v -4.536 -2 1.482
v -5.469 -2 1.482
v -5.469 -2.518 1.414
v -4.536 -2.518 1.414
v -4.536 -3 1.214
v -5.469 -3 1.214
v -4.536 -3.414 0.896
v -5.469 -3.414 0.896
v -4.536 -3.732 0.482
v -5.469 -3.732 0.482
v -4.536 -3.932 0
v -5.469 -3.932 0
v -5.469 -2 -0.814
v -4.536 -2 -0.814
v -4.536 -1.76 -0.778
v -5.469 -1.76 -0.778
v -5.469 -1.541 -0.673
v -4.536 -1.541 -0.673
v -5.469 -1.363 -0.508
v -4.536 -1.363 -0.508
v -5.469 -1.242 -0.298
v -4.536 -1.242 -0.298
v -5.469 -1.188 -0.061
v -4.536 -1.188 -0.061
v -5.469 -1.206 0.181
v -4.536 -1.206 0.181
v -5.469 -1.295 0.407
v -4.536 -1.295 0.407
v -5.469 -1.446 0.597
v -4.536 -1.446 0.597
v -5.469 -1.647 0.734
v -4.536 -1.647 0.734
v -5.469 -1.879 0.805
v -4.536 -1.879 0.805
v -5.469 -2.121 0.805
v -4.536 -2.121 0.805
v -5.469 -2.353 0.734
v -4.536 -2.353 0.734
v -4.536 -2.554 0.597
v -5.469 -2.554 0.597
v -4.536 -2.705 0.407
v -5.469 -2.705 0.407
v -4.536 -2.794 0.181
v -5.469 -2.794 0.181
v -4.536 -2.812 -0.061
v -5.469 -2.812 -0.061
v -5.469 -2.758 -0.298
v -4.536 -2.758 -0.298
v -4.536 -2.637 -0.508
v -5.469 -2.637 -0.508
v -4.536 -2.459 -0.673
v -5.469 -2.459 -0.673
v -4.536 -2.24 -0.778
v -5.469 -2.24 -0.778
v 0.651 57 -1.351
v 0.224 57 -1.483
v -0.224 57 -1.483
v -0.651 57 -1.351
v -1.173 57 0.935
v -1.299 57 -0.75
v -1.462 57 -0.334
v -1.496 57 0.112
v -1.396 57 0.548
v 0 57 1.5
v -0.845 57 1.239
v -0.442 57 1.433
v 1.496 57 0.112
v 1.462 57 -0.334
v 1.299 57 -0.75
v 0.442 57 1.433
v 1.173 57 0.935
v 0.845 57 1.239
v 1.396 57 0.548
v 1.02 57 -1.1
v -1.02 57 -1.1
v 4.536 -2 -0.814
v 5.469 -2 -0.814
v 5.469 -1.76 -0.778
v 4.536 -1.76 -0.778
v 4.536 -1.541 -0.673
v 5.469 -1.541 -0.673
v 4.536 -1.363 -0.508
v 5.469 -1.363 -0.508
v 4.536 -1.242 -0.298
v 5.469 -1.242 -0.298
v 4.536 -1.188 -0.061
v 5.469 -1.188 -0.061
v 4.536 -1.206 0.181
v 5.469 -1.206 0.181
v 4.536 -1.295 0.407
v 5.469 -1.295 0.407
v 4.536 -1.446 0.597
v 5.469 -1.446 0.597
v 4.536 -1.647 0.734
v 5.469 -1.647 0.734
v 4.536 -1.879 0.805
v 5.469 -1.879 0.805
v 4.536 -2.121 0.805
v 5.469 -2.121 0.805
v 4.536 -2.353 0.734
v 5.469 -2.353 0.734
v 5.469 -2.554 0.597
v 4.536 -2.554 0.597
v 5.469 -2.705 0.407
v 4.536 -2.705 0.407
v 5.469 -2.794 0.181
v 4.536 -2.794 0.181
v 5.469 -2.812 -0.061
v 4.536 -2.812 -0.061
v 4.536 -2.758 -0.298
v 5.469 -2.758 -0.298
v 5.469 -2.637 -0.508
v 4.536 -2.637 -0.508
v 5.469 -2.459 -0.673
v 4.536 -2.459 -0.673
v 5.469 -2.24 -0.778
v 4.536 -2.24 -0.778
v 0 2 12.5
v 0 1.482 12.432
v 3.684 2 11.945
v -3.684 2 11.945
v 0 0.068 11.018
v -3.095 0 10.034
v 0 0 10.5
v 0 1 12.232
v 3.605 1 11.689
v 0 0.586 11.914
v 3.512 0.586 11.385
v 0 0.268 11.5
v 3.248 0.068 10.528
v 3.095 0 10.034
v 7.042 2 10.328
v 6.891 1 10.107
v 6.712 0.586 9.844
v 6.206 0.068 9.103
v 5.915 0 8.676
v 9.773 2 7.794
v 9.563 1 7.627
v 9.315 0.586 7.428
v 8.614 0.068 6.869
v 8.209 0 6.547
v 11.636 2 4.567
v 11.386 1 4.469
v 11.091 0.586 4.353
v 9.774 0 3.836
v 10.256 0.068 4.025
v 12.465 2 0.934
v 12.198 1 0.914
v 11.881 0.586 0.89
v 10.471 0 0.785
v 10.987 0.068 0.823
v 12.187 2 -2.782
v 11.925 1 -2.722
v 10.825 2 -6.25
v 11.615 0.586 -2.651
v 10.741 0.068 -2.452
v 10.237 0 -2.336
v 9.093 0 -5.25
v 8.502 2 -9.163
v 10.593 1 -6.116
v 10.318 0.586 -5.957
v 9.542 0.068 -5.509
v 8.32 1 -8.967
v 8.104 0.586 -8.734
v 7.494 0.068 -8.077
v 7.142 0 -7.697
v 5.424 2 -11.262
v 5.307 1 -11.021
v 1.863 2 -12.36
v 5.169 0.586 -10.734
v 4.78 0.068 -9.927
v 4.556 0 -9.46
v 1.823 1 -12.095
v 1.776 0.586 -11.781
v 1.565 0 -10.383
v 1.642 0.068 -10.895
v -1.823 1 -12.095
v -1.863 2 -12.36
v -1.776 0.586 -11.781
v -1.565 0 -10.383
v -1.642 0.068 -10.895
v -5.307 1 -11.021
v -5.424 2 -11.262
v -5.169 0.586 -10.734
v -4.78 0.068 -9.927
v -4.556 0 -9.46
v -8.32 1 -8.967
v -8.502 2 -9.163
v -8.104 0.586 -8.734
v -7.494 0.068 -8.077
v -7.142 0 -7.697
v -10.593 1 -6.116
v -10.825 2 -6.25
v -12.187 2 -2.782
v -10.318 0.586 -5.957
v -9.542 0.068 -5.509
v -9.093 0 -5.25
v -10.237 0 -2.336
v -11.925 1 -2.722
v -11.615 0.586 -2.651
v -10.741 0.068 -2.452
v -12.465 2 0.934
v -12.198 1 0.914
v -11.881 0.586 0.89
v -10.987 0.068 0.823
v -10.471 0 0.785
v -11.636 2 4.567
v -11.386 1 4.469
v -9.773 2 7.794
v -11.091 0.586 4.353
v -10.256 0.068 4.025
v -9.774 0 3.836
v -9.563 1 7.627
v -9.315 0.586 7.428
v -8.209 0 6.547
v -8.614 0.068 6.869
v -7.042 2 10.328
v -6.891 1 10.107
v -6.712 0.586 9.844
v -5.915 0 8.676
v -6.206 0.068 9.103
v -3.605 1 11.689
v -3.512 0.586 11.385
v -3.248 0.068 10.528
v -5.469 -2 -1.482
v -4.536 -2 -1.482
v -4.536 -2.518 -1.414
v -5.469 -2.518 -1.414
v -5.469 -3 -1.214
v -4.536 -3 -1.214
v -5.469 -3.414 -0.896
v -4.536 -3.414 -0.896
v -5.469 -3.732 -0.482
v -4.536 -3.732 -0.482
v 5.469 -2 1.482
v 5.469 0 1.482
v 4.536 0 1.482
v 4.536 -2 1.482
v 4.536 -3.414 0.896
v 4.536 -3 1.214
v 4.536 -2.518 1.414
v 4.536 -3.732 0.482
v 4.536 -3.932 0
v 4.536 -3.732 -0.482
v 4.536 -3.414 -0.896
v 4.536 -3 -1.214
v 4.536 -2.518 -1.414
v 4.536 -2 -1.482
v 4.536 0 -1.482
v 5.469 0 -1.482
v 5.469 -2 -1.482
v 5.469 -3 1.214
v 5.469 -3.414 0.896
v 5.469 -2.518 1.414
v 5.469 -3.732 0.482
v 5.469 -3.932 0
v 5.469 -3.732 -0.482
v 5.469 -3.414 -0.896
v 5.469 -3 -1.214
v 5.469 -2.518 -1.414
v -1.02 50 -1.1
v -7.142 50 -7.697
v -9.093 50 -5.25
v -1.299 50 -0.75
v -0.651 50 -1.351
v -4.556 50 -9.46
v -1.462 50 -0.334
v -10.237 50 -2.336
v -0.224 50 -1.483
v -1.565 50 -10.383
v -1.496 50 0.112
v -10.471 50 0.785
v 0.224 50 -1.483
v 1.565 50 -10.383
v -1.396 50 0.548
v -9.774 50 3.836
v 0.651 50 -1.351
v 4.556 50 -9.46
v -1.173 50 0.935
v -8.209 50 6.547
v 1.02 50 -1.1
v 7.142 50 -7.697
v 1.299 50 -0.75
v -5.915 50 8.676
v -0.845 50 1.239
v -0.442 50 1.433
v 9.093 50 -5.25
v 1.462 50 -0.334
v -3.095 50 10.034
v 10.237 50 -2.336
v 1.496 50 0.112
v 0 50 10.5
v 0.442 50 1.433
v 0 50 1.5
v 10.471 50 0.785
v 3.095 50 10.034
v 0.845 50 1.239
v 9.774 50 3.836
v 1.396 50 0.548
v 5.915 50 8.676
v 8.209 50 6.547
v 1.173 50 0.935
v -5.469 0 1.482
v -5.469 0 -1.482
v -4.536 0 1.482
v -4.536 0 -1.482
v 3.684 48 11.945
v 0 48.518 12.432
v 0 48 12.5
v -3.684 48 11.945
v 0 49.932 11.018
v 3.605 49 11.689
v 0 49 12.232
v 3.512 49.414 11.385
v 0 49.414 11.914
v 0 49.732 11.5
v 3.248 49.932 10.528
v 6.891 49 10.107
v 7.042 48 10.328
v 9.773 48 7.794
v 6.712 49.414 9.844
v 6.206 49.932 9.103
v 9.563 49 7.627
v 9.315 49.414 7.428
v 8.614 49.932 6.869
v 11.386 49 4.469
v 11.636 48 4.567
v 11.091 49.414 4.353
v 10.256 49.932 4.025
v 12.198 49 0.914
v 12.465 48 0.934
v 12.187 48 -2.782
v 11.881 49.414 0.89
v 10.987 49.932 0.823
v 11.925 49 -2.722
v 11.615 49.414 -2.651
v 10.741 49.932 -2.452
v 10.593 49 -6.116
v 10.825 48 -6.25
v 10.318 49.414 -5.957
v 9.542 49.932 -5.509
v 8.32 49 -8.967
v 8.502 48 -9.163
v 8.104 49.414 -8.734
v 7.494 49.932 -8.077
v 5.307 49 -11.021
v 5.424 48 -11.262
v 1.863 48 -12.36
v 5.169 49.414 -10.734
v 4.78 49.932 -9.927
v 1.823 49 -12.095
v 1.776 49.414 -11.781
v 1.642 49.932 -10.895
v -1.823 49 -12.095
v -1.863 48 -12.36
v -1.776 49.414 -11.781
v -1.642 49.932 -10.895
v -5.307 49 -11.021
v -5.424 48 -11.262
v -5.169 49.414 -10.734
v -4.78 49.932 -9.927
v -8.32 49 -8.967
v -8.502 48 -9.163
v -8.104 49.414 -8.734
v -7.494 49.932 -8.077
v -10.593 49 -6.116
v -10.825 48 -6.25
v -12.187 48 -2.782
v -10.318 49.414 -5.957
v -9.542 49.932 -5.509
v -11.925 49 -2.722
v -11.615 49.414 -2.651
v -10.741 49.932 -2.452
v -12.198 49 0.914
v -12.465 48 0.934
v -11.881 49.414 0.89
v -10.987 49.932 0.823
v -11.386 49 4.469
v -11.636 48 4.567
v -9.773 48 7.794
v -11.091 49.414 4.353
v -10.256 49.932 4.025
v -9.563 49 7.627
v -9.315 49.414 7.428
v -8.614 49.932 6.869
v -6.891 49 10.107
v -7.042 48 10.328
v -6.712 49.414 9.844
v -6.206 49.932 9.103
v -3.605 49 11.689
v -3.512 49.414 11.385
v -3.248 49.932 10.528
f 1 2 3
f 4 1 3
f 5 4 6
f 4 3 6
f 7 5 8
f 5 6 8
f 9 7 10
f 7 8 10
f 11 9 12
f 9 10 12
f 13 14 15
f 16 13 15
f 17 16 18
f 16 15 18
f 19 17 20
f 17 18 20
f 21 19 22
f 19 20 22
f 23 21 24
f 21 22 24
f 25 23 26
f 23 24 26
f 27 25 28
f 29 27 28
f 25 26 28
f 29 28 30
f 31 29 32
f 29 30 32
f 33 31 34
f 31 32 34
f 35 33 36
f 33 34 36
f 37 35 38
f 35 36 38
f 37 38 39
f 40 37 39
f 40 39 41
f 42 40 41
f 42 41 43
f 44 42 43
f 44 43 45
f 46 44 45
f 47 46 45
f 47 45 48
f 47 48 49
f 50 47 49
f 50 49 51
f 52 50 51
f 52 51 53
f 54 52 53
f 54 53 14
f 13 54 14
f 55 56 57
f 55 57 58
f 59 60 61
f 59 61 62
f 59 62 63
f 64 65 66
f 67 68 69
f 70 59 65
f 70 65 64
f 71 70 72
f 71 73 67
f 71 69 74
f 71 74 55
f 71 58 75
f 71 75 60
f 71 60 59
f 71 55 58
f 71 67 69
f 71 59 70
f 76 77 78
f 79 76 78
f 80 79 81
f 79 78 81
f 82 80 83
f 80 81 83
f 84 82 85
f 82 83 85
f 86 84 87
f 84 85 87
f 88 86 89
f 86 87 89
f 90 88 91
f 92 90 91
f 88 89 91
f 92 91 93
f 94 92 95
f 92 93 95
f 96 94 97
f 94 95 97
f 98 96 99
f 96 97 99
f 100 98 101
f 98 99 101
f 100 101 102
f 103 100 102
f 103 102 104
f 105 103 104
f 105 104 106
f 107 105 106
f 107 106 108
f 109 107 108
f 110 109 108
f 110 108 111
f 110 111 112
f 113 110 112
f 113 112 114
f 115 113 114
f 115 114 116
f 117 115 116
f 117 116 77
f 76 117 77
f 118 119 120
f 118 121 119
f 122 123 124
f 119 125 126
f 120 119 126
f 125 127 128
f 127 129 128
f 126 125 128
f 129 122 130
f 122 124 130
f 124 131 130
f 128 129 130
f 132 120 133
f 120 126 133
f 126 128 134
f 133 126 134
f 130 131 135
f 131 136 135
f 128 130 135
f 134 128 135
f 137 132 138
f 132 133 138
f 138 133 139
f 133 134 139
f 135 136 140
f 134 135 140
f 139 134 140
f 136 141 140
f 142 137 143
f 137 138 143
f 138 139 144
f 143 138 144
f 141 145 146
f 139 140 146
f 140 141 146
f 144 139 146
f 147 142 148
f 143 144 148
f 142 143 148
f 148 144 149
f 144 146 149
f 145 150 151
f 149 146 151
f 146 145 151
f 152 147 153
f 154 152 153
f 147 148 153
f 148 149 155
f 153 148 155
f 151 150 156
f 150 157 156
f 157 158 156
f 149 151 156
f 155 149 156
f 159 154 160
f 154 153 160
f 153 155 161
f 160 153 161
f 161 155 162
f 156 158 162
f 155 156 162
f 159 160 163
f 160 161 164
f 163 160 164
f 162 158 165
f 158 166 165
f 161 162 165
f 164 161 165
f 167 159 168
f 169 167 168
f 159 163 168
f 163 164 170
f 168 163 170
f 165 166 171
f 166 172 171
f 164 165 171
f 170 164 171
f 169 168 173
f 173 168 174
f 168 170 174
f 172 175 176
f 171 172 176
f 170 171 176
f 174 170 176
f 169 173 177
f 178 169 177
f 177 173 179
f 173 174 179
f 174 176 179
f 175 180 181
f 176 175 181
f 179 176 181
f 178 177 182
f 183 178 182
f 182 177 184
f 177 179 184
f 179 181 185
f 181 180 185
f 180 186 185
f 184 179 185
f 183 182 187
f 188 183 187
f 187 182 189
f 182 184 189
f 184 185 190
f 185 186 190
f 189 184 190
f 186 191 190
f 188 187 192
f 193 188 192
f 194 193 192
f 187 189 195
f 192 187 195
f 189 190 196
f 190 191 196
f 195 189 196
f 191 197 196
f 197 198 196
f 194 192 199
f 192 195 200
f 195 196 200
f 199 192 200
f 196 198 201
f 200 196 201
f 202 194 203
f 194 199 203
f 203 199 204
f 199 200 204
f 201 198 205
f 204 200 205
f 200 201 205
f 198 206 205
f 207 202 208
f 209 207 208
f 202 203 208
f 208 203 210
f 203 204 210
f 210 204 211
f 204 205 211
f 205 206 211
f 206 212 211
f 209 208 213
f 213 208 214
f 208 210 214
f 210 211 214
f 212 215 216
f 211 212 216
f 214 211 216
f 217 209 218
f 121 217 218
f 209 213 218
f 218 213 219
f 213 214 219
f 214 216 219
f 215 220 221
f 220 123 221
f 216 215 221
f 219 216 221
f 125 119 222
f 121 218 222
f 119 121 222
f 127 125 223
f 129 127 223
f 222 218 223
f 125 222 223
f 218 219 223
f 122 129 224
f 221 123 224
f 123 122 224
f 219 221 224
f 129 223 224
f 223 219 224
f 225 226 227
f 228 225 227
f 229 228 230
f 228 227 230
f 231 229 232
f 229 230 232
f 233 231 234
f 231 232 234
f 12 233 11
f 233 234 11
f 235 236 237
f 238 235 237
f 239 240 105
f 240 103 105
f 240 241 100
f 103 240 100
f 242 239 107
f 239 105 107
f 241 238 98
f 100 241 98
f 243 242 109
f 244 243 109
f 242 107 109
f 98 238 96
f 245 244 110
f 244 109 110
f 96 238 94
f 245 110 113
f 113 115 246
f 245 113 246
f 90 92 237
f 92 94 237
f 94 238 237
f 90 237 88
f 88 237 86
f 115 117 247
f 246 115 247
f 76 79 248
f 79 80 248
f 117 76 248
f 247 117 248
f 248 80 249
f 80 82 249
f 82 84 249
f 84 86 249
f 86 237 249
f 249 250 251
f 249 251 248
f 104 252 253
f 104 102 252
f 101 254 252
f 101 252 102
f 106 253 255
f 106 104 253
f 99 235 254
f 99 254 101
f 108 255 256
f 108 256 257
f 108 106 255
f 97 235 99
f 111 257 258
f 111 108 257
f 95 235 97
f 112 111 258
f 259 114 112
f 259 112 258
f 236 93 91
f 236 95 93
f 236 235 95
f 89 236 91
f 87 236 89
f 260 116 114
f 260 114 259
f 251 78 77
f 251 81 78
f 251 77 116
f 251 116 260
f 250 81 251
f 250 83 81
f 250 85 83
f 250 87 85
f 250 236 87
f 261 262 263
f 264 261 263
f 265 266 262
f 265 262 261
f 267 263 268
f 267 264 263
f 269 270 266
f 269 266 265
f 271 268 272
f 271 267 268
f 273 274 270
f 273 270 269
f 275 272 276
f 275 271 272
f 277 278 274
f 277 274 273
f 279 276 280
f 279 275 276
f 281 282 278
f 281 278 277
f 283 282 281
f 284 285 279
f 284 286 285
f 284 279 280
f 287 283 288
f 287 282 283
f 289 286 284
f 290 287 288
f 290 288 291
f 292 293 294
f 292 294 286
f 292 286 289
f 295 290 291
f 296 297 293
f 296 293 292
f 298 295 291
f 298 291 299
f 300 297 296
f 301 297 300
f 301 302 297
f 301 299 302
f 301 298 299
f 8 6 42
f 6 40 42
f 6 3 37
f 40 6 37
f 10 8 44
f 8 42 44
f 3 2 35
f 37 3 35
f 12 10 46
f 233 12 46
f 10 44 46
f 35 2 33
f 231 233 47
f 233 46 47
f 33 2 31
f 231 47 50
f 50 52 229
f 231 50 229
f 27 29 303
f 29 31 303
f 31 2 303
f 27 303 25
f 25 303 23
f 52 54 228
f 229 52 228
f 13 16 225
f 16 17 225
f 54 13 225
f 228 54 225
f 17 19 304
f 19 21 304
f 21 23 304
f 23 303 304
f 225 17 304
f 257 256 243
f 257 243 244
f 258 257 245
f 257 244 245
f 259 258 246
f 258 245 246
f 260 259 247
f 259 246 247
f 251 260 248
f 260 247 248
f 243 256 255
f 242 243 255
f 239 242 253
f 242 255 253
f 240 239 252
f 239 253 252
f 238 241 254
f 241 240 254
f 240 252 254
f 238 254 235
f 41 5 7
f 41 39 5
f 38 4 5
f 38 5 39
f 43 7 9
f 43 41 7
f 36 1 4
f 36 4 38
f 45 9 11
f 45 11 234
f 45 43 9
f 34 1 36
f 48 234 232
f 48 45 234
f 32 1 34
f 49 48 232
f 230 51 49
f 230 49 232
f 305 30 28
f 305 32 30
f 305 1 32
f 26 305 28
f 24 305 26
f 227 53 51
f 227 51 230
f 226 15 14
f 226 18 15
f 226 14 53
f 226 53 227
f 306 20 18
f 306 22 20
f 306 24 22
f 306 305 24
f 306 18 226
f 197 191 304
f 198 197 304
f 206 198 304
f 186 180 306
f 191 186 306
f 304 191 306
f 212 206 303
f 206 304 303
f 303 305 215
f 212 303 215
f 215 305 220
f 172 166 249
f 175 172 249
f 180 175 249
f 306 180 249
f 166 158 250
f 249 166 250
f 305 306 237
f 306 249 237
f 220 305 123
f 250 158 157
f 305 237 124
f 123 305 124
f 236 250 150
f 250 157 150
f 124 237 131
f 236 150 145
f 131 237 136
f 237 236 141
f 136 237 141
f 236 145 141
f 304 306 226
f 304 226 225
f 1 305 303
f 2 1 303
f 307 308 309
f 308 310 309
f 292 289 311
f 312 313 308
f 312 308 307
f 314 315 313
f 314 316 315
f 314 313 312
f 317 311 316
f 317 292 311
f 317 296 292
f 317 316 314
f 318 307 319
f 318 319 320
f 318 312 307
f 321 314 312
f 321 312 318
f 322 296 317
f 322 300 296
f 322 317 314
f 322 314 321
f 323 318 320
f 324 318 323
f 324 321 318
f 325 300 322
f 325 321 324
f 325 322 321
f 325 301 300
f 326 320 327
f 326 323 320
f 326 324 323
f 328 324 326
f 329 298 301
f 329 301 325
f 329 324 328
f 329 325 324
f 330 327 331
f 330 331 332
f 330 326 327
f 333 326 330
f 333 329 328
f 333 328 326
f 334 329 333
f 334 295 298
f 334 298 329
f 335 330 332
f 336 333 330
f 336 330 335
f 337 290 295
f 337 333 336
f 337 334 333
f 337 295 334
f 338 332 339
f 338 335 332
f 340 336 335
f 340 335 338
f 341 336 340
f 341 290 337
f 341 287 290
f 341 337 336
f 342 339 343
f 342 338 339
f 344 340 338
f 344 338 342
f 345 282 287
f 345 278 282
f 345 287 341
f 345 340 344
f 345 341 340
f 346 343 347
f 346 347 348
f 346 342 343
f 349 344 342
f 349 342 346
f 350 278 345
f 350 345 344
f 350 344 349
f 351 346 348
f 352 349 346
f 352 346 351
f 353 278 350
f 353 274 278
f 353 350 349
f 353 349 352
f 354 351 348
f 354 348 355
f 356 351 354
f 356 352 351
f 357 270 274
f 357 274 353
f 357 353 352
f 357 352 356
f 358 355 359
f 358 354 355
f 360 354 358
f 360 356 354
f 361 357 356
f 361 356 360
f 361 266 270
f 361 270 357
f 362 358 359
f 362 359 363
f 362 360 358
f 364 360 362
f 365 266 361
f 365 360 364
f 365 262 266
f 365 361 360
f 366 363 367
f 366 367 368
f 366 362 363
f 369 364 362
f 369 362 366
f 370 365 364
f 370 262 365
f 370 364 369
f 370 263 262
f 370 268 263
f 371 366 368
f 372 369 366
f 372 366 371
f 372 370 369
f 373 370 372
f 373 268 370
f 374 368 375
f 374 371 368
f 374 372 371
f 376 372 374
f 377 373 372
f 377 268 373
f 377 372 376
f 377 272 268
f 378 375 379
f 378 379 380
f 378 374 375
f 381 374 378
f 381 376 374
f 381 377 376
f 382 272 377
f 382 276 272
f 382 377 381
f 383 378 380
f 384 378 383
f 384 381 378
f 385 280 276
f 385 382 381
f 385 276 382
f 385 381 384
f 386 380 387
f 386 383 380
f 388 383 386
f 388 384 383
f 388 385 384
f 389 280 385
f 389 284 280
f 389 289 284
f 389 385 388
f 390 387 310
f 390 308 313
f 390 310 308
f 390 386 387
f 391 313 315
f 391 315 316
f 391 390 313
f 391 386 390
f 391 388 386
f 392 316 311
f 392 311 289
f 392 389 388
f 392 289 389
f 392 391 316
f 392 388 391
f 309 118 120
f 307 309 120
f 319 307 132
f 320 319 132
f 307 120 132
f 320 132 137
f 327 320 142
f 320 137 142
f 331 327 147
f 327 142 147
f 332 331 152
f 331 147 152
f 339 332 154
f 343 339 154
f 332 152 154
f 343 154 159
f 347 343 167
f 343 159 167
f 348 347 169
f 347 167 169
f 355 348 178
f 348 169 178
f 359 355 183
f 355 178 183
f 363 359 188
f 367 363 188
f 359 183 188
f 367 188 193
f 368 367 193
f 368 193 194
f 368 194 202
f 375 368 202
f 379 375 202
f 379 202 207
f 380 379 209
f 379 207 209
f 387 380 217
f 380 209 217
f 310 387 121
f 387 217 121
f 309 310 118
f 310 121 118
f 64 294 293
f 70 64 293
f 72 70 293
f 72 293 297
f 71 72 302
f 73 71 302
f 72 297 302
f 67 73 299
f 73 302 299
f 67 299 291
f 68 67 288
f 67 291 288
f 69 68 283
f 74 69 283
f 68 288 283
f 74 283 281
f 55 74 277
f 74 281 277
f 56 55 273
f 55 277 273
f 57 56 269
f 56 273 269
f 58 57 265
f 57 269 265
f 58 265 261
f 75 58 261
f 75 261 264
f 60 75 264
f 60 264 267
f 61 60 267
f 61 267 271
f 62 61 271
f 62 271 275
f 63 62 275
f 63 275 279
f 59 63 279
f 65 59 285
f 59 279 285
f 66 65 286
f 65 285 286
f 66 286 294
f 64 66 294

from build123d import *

# Parameters (mm, degrees)
CROQUIS2_R              = 12.5
SALIENTE_EXTRUIR1_DEPTH = 50
REDONDEO1_R             = 2
CROQUIS4_R              = 1.5
SALIENTE_EXTRUIR2_DEPTH = 7
CROQUIS5_W              = 0.93235804
CROQUIS5_H              = 2.963644212
SALIENTE_EXTRUIR3_DEPTH = 4
REDONDEO2_R             = 2
CROQUIS6_R              = 0.814443909
CORTAR_EXTRUIR3_DEPTH   = 18


with BuildPart() as part:
    # Croquis2 → Saliente-Extruir1 (new body)
    with BuildSketch(Plane(origin=(0, 0, 0), x_dir=(1, 0, 0), z_dir=(0, 1, 0))):
        with Locations(Location((0, 0, 0), (0, 0, 270))):
            Circle(CROQUIS2_R)
    extrude(amount=SALIENTE_EXTRUIR1_DEPTH)

    # Redondeo1
    redondeo1_edges = [part.edges().sort_by_distance(p)[0] for p in [
        (0, 0, -12.5),
        (0, 50, -12.5),
    ]]
    fillet(redondeo1_edges, radius=REDONDEO1_R)

    # Croquis4 → Saliente-Extruir2 (add)
    with BuildSketch(Plane(origin=(0, 50, 0), x_dir=(1, 0, 0), z_dir=(0, 1, 0))):
        with Locations(Location((0, 0, 0), (0, 0, 270))):
            Circle(CROQUIS4_R)
    extrude(amount=SALIENTE_EXTRUIR2_DEPTH)

    # Croquis5 → Saliente-Extruir3 (add)
    with BuildSketch(Plane(origin=(0, 0, 0), x_dir=(-1, 0, 0), z_dir=(0, -1, 0))):
        with Locations((-5.00245948, 0)):
            Rectangle(CROQUIS5_W, CROQUIS5_H)
        with Locations((5.00245948, 0)):
            Rectangle(CROQUIS5_W, CROQUIS5_H)
    extrude(amount=SALIENTE_EXTRUIR3_DEPTH)

    # Redondeo2
    # the kernel refuses this fillet: 2 mm, written as the material it takes off along each edge
    with BuildSketch(Plane(origin=(-0.46371954, -4, -1.481822106), x_dir=(0, 1, 0), z_dir=(1, 0, 0)), Plane(origin=(10.4686385, -4, 1.481822106), x_dir=(0, 1, 0), z_dir=(-1, 0, 0))) as redondeo2_piece_1:
        with BuildLine():
            CenterArc((REDONDEO2_R, REDONDEO2_R), REDONDEO2_R, 180, 90)
            Line((0, REDONDEO2_R), (0, 0))
            Line((0, 0), (REDONDEO2_R, 0))
        make_face()
    extrude(amount=10.932358039, mode=Mode.SUBTRACT)
    with BuildSketch(Plane(origin=(-10.4686385, -4, 1.481822106), x_dir=(0, 1, 0), z_dir=(1, 0, 0)), Plane(origin=(0.46371954, -4, -1.481822106), x_dir=(0, 1, 0), z_dir=(-1, 0, 0))) as redondeo2_piece_2:
        with BuildLine():
            CenterArc((REDONDEO2_R, -REDONDEO2_R), REDONDEO2_R, 90, 90)
            Line((0, -REDONDEO2_R), (0, 0))
            Line((0, 0), (REDONDEO2_R, 0))
        make_face()
    extrude(amount=10.932358039, mode=Mode.SUBTRACT)

    # Croquis6 → Cortar-Extruir3 (cut)
    with BuildSketch(Plane(origin=(5.4686385, 0, 0), x_dir=(0, 0, -1), z_dir=(1, 0, 0))):
        with Locations((0, -2)):
            Circle(CROQUIS6_R)
    extrude(amount=-CORTAR_EXTRUIR3_DEPTH, mode=Mode.SUBTRACT)


solid = part.part
